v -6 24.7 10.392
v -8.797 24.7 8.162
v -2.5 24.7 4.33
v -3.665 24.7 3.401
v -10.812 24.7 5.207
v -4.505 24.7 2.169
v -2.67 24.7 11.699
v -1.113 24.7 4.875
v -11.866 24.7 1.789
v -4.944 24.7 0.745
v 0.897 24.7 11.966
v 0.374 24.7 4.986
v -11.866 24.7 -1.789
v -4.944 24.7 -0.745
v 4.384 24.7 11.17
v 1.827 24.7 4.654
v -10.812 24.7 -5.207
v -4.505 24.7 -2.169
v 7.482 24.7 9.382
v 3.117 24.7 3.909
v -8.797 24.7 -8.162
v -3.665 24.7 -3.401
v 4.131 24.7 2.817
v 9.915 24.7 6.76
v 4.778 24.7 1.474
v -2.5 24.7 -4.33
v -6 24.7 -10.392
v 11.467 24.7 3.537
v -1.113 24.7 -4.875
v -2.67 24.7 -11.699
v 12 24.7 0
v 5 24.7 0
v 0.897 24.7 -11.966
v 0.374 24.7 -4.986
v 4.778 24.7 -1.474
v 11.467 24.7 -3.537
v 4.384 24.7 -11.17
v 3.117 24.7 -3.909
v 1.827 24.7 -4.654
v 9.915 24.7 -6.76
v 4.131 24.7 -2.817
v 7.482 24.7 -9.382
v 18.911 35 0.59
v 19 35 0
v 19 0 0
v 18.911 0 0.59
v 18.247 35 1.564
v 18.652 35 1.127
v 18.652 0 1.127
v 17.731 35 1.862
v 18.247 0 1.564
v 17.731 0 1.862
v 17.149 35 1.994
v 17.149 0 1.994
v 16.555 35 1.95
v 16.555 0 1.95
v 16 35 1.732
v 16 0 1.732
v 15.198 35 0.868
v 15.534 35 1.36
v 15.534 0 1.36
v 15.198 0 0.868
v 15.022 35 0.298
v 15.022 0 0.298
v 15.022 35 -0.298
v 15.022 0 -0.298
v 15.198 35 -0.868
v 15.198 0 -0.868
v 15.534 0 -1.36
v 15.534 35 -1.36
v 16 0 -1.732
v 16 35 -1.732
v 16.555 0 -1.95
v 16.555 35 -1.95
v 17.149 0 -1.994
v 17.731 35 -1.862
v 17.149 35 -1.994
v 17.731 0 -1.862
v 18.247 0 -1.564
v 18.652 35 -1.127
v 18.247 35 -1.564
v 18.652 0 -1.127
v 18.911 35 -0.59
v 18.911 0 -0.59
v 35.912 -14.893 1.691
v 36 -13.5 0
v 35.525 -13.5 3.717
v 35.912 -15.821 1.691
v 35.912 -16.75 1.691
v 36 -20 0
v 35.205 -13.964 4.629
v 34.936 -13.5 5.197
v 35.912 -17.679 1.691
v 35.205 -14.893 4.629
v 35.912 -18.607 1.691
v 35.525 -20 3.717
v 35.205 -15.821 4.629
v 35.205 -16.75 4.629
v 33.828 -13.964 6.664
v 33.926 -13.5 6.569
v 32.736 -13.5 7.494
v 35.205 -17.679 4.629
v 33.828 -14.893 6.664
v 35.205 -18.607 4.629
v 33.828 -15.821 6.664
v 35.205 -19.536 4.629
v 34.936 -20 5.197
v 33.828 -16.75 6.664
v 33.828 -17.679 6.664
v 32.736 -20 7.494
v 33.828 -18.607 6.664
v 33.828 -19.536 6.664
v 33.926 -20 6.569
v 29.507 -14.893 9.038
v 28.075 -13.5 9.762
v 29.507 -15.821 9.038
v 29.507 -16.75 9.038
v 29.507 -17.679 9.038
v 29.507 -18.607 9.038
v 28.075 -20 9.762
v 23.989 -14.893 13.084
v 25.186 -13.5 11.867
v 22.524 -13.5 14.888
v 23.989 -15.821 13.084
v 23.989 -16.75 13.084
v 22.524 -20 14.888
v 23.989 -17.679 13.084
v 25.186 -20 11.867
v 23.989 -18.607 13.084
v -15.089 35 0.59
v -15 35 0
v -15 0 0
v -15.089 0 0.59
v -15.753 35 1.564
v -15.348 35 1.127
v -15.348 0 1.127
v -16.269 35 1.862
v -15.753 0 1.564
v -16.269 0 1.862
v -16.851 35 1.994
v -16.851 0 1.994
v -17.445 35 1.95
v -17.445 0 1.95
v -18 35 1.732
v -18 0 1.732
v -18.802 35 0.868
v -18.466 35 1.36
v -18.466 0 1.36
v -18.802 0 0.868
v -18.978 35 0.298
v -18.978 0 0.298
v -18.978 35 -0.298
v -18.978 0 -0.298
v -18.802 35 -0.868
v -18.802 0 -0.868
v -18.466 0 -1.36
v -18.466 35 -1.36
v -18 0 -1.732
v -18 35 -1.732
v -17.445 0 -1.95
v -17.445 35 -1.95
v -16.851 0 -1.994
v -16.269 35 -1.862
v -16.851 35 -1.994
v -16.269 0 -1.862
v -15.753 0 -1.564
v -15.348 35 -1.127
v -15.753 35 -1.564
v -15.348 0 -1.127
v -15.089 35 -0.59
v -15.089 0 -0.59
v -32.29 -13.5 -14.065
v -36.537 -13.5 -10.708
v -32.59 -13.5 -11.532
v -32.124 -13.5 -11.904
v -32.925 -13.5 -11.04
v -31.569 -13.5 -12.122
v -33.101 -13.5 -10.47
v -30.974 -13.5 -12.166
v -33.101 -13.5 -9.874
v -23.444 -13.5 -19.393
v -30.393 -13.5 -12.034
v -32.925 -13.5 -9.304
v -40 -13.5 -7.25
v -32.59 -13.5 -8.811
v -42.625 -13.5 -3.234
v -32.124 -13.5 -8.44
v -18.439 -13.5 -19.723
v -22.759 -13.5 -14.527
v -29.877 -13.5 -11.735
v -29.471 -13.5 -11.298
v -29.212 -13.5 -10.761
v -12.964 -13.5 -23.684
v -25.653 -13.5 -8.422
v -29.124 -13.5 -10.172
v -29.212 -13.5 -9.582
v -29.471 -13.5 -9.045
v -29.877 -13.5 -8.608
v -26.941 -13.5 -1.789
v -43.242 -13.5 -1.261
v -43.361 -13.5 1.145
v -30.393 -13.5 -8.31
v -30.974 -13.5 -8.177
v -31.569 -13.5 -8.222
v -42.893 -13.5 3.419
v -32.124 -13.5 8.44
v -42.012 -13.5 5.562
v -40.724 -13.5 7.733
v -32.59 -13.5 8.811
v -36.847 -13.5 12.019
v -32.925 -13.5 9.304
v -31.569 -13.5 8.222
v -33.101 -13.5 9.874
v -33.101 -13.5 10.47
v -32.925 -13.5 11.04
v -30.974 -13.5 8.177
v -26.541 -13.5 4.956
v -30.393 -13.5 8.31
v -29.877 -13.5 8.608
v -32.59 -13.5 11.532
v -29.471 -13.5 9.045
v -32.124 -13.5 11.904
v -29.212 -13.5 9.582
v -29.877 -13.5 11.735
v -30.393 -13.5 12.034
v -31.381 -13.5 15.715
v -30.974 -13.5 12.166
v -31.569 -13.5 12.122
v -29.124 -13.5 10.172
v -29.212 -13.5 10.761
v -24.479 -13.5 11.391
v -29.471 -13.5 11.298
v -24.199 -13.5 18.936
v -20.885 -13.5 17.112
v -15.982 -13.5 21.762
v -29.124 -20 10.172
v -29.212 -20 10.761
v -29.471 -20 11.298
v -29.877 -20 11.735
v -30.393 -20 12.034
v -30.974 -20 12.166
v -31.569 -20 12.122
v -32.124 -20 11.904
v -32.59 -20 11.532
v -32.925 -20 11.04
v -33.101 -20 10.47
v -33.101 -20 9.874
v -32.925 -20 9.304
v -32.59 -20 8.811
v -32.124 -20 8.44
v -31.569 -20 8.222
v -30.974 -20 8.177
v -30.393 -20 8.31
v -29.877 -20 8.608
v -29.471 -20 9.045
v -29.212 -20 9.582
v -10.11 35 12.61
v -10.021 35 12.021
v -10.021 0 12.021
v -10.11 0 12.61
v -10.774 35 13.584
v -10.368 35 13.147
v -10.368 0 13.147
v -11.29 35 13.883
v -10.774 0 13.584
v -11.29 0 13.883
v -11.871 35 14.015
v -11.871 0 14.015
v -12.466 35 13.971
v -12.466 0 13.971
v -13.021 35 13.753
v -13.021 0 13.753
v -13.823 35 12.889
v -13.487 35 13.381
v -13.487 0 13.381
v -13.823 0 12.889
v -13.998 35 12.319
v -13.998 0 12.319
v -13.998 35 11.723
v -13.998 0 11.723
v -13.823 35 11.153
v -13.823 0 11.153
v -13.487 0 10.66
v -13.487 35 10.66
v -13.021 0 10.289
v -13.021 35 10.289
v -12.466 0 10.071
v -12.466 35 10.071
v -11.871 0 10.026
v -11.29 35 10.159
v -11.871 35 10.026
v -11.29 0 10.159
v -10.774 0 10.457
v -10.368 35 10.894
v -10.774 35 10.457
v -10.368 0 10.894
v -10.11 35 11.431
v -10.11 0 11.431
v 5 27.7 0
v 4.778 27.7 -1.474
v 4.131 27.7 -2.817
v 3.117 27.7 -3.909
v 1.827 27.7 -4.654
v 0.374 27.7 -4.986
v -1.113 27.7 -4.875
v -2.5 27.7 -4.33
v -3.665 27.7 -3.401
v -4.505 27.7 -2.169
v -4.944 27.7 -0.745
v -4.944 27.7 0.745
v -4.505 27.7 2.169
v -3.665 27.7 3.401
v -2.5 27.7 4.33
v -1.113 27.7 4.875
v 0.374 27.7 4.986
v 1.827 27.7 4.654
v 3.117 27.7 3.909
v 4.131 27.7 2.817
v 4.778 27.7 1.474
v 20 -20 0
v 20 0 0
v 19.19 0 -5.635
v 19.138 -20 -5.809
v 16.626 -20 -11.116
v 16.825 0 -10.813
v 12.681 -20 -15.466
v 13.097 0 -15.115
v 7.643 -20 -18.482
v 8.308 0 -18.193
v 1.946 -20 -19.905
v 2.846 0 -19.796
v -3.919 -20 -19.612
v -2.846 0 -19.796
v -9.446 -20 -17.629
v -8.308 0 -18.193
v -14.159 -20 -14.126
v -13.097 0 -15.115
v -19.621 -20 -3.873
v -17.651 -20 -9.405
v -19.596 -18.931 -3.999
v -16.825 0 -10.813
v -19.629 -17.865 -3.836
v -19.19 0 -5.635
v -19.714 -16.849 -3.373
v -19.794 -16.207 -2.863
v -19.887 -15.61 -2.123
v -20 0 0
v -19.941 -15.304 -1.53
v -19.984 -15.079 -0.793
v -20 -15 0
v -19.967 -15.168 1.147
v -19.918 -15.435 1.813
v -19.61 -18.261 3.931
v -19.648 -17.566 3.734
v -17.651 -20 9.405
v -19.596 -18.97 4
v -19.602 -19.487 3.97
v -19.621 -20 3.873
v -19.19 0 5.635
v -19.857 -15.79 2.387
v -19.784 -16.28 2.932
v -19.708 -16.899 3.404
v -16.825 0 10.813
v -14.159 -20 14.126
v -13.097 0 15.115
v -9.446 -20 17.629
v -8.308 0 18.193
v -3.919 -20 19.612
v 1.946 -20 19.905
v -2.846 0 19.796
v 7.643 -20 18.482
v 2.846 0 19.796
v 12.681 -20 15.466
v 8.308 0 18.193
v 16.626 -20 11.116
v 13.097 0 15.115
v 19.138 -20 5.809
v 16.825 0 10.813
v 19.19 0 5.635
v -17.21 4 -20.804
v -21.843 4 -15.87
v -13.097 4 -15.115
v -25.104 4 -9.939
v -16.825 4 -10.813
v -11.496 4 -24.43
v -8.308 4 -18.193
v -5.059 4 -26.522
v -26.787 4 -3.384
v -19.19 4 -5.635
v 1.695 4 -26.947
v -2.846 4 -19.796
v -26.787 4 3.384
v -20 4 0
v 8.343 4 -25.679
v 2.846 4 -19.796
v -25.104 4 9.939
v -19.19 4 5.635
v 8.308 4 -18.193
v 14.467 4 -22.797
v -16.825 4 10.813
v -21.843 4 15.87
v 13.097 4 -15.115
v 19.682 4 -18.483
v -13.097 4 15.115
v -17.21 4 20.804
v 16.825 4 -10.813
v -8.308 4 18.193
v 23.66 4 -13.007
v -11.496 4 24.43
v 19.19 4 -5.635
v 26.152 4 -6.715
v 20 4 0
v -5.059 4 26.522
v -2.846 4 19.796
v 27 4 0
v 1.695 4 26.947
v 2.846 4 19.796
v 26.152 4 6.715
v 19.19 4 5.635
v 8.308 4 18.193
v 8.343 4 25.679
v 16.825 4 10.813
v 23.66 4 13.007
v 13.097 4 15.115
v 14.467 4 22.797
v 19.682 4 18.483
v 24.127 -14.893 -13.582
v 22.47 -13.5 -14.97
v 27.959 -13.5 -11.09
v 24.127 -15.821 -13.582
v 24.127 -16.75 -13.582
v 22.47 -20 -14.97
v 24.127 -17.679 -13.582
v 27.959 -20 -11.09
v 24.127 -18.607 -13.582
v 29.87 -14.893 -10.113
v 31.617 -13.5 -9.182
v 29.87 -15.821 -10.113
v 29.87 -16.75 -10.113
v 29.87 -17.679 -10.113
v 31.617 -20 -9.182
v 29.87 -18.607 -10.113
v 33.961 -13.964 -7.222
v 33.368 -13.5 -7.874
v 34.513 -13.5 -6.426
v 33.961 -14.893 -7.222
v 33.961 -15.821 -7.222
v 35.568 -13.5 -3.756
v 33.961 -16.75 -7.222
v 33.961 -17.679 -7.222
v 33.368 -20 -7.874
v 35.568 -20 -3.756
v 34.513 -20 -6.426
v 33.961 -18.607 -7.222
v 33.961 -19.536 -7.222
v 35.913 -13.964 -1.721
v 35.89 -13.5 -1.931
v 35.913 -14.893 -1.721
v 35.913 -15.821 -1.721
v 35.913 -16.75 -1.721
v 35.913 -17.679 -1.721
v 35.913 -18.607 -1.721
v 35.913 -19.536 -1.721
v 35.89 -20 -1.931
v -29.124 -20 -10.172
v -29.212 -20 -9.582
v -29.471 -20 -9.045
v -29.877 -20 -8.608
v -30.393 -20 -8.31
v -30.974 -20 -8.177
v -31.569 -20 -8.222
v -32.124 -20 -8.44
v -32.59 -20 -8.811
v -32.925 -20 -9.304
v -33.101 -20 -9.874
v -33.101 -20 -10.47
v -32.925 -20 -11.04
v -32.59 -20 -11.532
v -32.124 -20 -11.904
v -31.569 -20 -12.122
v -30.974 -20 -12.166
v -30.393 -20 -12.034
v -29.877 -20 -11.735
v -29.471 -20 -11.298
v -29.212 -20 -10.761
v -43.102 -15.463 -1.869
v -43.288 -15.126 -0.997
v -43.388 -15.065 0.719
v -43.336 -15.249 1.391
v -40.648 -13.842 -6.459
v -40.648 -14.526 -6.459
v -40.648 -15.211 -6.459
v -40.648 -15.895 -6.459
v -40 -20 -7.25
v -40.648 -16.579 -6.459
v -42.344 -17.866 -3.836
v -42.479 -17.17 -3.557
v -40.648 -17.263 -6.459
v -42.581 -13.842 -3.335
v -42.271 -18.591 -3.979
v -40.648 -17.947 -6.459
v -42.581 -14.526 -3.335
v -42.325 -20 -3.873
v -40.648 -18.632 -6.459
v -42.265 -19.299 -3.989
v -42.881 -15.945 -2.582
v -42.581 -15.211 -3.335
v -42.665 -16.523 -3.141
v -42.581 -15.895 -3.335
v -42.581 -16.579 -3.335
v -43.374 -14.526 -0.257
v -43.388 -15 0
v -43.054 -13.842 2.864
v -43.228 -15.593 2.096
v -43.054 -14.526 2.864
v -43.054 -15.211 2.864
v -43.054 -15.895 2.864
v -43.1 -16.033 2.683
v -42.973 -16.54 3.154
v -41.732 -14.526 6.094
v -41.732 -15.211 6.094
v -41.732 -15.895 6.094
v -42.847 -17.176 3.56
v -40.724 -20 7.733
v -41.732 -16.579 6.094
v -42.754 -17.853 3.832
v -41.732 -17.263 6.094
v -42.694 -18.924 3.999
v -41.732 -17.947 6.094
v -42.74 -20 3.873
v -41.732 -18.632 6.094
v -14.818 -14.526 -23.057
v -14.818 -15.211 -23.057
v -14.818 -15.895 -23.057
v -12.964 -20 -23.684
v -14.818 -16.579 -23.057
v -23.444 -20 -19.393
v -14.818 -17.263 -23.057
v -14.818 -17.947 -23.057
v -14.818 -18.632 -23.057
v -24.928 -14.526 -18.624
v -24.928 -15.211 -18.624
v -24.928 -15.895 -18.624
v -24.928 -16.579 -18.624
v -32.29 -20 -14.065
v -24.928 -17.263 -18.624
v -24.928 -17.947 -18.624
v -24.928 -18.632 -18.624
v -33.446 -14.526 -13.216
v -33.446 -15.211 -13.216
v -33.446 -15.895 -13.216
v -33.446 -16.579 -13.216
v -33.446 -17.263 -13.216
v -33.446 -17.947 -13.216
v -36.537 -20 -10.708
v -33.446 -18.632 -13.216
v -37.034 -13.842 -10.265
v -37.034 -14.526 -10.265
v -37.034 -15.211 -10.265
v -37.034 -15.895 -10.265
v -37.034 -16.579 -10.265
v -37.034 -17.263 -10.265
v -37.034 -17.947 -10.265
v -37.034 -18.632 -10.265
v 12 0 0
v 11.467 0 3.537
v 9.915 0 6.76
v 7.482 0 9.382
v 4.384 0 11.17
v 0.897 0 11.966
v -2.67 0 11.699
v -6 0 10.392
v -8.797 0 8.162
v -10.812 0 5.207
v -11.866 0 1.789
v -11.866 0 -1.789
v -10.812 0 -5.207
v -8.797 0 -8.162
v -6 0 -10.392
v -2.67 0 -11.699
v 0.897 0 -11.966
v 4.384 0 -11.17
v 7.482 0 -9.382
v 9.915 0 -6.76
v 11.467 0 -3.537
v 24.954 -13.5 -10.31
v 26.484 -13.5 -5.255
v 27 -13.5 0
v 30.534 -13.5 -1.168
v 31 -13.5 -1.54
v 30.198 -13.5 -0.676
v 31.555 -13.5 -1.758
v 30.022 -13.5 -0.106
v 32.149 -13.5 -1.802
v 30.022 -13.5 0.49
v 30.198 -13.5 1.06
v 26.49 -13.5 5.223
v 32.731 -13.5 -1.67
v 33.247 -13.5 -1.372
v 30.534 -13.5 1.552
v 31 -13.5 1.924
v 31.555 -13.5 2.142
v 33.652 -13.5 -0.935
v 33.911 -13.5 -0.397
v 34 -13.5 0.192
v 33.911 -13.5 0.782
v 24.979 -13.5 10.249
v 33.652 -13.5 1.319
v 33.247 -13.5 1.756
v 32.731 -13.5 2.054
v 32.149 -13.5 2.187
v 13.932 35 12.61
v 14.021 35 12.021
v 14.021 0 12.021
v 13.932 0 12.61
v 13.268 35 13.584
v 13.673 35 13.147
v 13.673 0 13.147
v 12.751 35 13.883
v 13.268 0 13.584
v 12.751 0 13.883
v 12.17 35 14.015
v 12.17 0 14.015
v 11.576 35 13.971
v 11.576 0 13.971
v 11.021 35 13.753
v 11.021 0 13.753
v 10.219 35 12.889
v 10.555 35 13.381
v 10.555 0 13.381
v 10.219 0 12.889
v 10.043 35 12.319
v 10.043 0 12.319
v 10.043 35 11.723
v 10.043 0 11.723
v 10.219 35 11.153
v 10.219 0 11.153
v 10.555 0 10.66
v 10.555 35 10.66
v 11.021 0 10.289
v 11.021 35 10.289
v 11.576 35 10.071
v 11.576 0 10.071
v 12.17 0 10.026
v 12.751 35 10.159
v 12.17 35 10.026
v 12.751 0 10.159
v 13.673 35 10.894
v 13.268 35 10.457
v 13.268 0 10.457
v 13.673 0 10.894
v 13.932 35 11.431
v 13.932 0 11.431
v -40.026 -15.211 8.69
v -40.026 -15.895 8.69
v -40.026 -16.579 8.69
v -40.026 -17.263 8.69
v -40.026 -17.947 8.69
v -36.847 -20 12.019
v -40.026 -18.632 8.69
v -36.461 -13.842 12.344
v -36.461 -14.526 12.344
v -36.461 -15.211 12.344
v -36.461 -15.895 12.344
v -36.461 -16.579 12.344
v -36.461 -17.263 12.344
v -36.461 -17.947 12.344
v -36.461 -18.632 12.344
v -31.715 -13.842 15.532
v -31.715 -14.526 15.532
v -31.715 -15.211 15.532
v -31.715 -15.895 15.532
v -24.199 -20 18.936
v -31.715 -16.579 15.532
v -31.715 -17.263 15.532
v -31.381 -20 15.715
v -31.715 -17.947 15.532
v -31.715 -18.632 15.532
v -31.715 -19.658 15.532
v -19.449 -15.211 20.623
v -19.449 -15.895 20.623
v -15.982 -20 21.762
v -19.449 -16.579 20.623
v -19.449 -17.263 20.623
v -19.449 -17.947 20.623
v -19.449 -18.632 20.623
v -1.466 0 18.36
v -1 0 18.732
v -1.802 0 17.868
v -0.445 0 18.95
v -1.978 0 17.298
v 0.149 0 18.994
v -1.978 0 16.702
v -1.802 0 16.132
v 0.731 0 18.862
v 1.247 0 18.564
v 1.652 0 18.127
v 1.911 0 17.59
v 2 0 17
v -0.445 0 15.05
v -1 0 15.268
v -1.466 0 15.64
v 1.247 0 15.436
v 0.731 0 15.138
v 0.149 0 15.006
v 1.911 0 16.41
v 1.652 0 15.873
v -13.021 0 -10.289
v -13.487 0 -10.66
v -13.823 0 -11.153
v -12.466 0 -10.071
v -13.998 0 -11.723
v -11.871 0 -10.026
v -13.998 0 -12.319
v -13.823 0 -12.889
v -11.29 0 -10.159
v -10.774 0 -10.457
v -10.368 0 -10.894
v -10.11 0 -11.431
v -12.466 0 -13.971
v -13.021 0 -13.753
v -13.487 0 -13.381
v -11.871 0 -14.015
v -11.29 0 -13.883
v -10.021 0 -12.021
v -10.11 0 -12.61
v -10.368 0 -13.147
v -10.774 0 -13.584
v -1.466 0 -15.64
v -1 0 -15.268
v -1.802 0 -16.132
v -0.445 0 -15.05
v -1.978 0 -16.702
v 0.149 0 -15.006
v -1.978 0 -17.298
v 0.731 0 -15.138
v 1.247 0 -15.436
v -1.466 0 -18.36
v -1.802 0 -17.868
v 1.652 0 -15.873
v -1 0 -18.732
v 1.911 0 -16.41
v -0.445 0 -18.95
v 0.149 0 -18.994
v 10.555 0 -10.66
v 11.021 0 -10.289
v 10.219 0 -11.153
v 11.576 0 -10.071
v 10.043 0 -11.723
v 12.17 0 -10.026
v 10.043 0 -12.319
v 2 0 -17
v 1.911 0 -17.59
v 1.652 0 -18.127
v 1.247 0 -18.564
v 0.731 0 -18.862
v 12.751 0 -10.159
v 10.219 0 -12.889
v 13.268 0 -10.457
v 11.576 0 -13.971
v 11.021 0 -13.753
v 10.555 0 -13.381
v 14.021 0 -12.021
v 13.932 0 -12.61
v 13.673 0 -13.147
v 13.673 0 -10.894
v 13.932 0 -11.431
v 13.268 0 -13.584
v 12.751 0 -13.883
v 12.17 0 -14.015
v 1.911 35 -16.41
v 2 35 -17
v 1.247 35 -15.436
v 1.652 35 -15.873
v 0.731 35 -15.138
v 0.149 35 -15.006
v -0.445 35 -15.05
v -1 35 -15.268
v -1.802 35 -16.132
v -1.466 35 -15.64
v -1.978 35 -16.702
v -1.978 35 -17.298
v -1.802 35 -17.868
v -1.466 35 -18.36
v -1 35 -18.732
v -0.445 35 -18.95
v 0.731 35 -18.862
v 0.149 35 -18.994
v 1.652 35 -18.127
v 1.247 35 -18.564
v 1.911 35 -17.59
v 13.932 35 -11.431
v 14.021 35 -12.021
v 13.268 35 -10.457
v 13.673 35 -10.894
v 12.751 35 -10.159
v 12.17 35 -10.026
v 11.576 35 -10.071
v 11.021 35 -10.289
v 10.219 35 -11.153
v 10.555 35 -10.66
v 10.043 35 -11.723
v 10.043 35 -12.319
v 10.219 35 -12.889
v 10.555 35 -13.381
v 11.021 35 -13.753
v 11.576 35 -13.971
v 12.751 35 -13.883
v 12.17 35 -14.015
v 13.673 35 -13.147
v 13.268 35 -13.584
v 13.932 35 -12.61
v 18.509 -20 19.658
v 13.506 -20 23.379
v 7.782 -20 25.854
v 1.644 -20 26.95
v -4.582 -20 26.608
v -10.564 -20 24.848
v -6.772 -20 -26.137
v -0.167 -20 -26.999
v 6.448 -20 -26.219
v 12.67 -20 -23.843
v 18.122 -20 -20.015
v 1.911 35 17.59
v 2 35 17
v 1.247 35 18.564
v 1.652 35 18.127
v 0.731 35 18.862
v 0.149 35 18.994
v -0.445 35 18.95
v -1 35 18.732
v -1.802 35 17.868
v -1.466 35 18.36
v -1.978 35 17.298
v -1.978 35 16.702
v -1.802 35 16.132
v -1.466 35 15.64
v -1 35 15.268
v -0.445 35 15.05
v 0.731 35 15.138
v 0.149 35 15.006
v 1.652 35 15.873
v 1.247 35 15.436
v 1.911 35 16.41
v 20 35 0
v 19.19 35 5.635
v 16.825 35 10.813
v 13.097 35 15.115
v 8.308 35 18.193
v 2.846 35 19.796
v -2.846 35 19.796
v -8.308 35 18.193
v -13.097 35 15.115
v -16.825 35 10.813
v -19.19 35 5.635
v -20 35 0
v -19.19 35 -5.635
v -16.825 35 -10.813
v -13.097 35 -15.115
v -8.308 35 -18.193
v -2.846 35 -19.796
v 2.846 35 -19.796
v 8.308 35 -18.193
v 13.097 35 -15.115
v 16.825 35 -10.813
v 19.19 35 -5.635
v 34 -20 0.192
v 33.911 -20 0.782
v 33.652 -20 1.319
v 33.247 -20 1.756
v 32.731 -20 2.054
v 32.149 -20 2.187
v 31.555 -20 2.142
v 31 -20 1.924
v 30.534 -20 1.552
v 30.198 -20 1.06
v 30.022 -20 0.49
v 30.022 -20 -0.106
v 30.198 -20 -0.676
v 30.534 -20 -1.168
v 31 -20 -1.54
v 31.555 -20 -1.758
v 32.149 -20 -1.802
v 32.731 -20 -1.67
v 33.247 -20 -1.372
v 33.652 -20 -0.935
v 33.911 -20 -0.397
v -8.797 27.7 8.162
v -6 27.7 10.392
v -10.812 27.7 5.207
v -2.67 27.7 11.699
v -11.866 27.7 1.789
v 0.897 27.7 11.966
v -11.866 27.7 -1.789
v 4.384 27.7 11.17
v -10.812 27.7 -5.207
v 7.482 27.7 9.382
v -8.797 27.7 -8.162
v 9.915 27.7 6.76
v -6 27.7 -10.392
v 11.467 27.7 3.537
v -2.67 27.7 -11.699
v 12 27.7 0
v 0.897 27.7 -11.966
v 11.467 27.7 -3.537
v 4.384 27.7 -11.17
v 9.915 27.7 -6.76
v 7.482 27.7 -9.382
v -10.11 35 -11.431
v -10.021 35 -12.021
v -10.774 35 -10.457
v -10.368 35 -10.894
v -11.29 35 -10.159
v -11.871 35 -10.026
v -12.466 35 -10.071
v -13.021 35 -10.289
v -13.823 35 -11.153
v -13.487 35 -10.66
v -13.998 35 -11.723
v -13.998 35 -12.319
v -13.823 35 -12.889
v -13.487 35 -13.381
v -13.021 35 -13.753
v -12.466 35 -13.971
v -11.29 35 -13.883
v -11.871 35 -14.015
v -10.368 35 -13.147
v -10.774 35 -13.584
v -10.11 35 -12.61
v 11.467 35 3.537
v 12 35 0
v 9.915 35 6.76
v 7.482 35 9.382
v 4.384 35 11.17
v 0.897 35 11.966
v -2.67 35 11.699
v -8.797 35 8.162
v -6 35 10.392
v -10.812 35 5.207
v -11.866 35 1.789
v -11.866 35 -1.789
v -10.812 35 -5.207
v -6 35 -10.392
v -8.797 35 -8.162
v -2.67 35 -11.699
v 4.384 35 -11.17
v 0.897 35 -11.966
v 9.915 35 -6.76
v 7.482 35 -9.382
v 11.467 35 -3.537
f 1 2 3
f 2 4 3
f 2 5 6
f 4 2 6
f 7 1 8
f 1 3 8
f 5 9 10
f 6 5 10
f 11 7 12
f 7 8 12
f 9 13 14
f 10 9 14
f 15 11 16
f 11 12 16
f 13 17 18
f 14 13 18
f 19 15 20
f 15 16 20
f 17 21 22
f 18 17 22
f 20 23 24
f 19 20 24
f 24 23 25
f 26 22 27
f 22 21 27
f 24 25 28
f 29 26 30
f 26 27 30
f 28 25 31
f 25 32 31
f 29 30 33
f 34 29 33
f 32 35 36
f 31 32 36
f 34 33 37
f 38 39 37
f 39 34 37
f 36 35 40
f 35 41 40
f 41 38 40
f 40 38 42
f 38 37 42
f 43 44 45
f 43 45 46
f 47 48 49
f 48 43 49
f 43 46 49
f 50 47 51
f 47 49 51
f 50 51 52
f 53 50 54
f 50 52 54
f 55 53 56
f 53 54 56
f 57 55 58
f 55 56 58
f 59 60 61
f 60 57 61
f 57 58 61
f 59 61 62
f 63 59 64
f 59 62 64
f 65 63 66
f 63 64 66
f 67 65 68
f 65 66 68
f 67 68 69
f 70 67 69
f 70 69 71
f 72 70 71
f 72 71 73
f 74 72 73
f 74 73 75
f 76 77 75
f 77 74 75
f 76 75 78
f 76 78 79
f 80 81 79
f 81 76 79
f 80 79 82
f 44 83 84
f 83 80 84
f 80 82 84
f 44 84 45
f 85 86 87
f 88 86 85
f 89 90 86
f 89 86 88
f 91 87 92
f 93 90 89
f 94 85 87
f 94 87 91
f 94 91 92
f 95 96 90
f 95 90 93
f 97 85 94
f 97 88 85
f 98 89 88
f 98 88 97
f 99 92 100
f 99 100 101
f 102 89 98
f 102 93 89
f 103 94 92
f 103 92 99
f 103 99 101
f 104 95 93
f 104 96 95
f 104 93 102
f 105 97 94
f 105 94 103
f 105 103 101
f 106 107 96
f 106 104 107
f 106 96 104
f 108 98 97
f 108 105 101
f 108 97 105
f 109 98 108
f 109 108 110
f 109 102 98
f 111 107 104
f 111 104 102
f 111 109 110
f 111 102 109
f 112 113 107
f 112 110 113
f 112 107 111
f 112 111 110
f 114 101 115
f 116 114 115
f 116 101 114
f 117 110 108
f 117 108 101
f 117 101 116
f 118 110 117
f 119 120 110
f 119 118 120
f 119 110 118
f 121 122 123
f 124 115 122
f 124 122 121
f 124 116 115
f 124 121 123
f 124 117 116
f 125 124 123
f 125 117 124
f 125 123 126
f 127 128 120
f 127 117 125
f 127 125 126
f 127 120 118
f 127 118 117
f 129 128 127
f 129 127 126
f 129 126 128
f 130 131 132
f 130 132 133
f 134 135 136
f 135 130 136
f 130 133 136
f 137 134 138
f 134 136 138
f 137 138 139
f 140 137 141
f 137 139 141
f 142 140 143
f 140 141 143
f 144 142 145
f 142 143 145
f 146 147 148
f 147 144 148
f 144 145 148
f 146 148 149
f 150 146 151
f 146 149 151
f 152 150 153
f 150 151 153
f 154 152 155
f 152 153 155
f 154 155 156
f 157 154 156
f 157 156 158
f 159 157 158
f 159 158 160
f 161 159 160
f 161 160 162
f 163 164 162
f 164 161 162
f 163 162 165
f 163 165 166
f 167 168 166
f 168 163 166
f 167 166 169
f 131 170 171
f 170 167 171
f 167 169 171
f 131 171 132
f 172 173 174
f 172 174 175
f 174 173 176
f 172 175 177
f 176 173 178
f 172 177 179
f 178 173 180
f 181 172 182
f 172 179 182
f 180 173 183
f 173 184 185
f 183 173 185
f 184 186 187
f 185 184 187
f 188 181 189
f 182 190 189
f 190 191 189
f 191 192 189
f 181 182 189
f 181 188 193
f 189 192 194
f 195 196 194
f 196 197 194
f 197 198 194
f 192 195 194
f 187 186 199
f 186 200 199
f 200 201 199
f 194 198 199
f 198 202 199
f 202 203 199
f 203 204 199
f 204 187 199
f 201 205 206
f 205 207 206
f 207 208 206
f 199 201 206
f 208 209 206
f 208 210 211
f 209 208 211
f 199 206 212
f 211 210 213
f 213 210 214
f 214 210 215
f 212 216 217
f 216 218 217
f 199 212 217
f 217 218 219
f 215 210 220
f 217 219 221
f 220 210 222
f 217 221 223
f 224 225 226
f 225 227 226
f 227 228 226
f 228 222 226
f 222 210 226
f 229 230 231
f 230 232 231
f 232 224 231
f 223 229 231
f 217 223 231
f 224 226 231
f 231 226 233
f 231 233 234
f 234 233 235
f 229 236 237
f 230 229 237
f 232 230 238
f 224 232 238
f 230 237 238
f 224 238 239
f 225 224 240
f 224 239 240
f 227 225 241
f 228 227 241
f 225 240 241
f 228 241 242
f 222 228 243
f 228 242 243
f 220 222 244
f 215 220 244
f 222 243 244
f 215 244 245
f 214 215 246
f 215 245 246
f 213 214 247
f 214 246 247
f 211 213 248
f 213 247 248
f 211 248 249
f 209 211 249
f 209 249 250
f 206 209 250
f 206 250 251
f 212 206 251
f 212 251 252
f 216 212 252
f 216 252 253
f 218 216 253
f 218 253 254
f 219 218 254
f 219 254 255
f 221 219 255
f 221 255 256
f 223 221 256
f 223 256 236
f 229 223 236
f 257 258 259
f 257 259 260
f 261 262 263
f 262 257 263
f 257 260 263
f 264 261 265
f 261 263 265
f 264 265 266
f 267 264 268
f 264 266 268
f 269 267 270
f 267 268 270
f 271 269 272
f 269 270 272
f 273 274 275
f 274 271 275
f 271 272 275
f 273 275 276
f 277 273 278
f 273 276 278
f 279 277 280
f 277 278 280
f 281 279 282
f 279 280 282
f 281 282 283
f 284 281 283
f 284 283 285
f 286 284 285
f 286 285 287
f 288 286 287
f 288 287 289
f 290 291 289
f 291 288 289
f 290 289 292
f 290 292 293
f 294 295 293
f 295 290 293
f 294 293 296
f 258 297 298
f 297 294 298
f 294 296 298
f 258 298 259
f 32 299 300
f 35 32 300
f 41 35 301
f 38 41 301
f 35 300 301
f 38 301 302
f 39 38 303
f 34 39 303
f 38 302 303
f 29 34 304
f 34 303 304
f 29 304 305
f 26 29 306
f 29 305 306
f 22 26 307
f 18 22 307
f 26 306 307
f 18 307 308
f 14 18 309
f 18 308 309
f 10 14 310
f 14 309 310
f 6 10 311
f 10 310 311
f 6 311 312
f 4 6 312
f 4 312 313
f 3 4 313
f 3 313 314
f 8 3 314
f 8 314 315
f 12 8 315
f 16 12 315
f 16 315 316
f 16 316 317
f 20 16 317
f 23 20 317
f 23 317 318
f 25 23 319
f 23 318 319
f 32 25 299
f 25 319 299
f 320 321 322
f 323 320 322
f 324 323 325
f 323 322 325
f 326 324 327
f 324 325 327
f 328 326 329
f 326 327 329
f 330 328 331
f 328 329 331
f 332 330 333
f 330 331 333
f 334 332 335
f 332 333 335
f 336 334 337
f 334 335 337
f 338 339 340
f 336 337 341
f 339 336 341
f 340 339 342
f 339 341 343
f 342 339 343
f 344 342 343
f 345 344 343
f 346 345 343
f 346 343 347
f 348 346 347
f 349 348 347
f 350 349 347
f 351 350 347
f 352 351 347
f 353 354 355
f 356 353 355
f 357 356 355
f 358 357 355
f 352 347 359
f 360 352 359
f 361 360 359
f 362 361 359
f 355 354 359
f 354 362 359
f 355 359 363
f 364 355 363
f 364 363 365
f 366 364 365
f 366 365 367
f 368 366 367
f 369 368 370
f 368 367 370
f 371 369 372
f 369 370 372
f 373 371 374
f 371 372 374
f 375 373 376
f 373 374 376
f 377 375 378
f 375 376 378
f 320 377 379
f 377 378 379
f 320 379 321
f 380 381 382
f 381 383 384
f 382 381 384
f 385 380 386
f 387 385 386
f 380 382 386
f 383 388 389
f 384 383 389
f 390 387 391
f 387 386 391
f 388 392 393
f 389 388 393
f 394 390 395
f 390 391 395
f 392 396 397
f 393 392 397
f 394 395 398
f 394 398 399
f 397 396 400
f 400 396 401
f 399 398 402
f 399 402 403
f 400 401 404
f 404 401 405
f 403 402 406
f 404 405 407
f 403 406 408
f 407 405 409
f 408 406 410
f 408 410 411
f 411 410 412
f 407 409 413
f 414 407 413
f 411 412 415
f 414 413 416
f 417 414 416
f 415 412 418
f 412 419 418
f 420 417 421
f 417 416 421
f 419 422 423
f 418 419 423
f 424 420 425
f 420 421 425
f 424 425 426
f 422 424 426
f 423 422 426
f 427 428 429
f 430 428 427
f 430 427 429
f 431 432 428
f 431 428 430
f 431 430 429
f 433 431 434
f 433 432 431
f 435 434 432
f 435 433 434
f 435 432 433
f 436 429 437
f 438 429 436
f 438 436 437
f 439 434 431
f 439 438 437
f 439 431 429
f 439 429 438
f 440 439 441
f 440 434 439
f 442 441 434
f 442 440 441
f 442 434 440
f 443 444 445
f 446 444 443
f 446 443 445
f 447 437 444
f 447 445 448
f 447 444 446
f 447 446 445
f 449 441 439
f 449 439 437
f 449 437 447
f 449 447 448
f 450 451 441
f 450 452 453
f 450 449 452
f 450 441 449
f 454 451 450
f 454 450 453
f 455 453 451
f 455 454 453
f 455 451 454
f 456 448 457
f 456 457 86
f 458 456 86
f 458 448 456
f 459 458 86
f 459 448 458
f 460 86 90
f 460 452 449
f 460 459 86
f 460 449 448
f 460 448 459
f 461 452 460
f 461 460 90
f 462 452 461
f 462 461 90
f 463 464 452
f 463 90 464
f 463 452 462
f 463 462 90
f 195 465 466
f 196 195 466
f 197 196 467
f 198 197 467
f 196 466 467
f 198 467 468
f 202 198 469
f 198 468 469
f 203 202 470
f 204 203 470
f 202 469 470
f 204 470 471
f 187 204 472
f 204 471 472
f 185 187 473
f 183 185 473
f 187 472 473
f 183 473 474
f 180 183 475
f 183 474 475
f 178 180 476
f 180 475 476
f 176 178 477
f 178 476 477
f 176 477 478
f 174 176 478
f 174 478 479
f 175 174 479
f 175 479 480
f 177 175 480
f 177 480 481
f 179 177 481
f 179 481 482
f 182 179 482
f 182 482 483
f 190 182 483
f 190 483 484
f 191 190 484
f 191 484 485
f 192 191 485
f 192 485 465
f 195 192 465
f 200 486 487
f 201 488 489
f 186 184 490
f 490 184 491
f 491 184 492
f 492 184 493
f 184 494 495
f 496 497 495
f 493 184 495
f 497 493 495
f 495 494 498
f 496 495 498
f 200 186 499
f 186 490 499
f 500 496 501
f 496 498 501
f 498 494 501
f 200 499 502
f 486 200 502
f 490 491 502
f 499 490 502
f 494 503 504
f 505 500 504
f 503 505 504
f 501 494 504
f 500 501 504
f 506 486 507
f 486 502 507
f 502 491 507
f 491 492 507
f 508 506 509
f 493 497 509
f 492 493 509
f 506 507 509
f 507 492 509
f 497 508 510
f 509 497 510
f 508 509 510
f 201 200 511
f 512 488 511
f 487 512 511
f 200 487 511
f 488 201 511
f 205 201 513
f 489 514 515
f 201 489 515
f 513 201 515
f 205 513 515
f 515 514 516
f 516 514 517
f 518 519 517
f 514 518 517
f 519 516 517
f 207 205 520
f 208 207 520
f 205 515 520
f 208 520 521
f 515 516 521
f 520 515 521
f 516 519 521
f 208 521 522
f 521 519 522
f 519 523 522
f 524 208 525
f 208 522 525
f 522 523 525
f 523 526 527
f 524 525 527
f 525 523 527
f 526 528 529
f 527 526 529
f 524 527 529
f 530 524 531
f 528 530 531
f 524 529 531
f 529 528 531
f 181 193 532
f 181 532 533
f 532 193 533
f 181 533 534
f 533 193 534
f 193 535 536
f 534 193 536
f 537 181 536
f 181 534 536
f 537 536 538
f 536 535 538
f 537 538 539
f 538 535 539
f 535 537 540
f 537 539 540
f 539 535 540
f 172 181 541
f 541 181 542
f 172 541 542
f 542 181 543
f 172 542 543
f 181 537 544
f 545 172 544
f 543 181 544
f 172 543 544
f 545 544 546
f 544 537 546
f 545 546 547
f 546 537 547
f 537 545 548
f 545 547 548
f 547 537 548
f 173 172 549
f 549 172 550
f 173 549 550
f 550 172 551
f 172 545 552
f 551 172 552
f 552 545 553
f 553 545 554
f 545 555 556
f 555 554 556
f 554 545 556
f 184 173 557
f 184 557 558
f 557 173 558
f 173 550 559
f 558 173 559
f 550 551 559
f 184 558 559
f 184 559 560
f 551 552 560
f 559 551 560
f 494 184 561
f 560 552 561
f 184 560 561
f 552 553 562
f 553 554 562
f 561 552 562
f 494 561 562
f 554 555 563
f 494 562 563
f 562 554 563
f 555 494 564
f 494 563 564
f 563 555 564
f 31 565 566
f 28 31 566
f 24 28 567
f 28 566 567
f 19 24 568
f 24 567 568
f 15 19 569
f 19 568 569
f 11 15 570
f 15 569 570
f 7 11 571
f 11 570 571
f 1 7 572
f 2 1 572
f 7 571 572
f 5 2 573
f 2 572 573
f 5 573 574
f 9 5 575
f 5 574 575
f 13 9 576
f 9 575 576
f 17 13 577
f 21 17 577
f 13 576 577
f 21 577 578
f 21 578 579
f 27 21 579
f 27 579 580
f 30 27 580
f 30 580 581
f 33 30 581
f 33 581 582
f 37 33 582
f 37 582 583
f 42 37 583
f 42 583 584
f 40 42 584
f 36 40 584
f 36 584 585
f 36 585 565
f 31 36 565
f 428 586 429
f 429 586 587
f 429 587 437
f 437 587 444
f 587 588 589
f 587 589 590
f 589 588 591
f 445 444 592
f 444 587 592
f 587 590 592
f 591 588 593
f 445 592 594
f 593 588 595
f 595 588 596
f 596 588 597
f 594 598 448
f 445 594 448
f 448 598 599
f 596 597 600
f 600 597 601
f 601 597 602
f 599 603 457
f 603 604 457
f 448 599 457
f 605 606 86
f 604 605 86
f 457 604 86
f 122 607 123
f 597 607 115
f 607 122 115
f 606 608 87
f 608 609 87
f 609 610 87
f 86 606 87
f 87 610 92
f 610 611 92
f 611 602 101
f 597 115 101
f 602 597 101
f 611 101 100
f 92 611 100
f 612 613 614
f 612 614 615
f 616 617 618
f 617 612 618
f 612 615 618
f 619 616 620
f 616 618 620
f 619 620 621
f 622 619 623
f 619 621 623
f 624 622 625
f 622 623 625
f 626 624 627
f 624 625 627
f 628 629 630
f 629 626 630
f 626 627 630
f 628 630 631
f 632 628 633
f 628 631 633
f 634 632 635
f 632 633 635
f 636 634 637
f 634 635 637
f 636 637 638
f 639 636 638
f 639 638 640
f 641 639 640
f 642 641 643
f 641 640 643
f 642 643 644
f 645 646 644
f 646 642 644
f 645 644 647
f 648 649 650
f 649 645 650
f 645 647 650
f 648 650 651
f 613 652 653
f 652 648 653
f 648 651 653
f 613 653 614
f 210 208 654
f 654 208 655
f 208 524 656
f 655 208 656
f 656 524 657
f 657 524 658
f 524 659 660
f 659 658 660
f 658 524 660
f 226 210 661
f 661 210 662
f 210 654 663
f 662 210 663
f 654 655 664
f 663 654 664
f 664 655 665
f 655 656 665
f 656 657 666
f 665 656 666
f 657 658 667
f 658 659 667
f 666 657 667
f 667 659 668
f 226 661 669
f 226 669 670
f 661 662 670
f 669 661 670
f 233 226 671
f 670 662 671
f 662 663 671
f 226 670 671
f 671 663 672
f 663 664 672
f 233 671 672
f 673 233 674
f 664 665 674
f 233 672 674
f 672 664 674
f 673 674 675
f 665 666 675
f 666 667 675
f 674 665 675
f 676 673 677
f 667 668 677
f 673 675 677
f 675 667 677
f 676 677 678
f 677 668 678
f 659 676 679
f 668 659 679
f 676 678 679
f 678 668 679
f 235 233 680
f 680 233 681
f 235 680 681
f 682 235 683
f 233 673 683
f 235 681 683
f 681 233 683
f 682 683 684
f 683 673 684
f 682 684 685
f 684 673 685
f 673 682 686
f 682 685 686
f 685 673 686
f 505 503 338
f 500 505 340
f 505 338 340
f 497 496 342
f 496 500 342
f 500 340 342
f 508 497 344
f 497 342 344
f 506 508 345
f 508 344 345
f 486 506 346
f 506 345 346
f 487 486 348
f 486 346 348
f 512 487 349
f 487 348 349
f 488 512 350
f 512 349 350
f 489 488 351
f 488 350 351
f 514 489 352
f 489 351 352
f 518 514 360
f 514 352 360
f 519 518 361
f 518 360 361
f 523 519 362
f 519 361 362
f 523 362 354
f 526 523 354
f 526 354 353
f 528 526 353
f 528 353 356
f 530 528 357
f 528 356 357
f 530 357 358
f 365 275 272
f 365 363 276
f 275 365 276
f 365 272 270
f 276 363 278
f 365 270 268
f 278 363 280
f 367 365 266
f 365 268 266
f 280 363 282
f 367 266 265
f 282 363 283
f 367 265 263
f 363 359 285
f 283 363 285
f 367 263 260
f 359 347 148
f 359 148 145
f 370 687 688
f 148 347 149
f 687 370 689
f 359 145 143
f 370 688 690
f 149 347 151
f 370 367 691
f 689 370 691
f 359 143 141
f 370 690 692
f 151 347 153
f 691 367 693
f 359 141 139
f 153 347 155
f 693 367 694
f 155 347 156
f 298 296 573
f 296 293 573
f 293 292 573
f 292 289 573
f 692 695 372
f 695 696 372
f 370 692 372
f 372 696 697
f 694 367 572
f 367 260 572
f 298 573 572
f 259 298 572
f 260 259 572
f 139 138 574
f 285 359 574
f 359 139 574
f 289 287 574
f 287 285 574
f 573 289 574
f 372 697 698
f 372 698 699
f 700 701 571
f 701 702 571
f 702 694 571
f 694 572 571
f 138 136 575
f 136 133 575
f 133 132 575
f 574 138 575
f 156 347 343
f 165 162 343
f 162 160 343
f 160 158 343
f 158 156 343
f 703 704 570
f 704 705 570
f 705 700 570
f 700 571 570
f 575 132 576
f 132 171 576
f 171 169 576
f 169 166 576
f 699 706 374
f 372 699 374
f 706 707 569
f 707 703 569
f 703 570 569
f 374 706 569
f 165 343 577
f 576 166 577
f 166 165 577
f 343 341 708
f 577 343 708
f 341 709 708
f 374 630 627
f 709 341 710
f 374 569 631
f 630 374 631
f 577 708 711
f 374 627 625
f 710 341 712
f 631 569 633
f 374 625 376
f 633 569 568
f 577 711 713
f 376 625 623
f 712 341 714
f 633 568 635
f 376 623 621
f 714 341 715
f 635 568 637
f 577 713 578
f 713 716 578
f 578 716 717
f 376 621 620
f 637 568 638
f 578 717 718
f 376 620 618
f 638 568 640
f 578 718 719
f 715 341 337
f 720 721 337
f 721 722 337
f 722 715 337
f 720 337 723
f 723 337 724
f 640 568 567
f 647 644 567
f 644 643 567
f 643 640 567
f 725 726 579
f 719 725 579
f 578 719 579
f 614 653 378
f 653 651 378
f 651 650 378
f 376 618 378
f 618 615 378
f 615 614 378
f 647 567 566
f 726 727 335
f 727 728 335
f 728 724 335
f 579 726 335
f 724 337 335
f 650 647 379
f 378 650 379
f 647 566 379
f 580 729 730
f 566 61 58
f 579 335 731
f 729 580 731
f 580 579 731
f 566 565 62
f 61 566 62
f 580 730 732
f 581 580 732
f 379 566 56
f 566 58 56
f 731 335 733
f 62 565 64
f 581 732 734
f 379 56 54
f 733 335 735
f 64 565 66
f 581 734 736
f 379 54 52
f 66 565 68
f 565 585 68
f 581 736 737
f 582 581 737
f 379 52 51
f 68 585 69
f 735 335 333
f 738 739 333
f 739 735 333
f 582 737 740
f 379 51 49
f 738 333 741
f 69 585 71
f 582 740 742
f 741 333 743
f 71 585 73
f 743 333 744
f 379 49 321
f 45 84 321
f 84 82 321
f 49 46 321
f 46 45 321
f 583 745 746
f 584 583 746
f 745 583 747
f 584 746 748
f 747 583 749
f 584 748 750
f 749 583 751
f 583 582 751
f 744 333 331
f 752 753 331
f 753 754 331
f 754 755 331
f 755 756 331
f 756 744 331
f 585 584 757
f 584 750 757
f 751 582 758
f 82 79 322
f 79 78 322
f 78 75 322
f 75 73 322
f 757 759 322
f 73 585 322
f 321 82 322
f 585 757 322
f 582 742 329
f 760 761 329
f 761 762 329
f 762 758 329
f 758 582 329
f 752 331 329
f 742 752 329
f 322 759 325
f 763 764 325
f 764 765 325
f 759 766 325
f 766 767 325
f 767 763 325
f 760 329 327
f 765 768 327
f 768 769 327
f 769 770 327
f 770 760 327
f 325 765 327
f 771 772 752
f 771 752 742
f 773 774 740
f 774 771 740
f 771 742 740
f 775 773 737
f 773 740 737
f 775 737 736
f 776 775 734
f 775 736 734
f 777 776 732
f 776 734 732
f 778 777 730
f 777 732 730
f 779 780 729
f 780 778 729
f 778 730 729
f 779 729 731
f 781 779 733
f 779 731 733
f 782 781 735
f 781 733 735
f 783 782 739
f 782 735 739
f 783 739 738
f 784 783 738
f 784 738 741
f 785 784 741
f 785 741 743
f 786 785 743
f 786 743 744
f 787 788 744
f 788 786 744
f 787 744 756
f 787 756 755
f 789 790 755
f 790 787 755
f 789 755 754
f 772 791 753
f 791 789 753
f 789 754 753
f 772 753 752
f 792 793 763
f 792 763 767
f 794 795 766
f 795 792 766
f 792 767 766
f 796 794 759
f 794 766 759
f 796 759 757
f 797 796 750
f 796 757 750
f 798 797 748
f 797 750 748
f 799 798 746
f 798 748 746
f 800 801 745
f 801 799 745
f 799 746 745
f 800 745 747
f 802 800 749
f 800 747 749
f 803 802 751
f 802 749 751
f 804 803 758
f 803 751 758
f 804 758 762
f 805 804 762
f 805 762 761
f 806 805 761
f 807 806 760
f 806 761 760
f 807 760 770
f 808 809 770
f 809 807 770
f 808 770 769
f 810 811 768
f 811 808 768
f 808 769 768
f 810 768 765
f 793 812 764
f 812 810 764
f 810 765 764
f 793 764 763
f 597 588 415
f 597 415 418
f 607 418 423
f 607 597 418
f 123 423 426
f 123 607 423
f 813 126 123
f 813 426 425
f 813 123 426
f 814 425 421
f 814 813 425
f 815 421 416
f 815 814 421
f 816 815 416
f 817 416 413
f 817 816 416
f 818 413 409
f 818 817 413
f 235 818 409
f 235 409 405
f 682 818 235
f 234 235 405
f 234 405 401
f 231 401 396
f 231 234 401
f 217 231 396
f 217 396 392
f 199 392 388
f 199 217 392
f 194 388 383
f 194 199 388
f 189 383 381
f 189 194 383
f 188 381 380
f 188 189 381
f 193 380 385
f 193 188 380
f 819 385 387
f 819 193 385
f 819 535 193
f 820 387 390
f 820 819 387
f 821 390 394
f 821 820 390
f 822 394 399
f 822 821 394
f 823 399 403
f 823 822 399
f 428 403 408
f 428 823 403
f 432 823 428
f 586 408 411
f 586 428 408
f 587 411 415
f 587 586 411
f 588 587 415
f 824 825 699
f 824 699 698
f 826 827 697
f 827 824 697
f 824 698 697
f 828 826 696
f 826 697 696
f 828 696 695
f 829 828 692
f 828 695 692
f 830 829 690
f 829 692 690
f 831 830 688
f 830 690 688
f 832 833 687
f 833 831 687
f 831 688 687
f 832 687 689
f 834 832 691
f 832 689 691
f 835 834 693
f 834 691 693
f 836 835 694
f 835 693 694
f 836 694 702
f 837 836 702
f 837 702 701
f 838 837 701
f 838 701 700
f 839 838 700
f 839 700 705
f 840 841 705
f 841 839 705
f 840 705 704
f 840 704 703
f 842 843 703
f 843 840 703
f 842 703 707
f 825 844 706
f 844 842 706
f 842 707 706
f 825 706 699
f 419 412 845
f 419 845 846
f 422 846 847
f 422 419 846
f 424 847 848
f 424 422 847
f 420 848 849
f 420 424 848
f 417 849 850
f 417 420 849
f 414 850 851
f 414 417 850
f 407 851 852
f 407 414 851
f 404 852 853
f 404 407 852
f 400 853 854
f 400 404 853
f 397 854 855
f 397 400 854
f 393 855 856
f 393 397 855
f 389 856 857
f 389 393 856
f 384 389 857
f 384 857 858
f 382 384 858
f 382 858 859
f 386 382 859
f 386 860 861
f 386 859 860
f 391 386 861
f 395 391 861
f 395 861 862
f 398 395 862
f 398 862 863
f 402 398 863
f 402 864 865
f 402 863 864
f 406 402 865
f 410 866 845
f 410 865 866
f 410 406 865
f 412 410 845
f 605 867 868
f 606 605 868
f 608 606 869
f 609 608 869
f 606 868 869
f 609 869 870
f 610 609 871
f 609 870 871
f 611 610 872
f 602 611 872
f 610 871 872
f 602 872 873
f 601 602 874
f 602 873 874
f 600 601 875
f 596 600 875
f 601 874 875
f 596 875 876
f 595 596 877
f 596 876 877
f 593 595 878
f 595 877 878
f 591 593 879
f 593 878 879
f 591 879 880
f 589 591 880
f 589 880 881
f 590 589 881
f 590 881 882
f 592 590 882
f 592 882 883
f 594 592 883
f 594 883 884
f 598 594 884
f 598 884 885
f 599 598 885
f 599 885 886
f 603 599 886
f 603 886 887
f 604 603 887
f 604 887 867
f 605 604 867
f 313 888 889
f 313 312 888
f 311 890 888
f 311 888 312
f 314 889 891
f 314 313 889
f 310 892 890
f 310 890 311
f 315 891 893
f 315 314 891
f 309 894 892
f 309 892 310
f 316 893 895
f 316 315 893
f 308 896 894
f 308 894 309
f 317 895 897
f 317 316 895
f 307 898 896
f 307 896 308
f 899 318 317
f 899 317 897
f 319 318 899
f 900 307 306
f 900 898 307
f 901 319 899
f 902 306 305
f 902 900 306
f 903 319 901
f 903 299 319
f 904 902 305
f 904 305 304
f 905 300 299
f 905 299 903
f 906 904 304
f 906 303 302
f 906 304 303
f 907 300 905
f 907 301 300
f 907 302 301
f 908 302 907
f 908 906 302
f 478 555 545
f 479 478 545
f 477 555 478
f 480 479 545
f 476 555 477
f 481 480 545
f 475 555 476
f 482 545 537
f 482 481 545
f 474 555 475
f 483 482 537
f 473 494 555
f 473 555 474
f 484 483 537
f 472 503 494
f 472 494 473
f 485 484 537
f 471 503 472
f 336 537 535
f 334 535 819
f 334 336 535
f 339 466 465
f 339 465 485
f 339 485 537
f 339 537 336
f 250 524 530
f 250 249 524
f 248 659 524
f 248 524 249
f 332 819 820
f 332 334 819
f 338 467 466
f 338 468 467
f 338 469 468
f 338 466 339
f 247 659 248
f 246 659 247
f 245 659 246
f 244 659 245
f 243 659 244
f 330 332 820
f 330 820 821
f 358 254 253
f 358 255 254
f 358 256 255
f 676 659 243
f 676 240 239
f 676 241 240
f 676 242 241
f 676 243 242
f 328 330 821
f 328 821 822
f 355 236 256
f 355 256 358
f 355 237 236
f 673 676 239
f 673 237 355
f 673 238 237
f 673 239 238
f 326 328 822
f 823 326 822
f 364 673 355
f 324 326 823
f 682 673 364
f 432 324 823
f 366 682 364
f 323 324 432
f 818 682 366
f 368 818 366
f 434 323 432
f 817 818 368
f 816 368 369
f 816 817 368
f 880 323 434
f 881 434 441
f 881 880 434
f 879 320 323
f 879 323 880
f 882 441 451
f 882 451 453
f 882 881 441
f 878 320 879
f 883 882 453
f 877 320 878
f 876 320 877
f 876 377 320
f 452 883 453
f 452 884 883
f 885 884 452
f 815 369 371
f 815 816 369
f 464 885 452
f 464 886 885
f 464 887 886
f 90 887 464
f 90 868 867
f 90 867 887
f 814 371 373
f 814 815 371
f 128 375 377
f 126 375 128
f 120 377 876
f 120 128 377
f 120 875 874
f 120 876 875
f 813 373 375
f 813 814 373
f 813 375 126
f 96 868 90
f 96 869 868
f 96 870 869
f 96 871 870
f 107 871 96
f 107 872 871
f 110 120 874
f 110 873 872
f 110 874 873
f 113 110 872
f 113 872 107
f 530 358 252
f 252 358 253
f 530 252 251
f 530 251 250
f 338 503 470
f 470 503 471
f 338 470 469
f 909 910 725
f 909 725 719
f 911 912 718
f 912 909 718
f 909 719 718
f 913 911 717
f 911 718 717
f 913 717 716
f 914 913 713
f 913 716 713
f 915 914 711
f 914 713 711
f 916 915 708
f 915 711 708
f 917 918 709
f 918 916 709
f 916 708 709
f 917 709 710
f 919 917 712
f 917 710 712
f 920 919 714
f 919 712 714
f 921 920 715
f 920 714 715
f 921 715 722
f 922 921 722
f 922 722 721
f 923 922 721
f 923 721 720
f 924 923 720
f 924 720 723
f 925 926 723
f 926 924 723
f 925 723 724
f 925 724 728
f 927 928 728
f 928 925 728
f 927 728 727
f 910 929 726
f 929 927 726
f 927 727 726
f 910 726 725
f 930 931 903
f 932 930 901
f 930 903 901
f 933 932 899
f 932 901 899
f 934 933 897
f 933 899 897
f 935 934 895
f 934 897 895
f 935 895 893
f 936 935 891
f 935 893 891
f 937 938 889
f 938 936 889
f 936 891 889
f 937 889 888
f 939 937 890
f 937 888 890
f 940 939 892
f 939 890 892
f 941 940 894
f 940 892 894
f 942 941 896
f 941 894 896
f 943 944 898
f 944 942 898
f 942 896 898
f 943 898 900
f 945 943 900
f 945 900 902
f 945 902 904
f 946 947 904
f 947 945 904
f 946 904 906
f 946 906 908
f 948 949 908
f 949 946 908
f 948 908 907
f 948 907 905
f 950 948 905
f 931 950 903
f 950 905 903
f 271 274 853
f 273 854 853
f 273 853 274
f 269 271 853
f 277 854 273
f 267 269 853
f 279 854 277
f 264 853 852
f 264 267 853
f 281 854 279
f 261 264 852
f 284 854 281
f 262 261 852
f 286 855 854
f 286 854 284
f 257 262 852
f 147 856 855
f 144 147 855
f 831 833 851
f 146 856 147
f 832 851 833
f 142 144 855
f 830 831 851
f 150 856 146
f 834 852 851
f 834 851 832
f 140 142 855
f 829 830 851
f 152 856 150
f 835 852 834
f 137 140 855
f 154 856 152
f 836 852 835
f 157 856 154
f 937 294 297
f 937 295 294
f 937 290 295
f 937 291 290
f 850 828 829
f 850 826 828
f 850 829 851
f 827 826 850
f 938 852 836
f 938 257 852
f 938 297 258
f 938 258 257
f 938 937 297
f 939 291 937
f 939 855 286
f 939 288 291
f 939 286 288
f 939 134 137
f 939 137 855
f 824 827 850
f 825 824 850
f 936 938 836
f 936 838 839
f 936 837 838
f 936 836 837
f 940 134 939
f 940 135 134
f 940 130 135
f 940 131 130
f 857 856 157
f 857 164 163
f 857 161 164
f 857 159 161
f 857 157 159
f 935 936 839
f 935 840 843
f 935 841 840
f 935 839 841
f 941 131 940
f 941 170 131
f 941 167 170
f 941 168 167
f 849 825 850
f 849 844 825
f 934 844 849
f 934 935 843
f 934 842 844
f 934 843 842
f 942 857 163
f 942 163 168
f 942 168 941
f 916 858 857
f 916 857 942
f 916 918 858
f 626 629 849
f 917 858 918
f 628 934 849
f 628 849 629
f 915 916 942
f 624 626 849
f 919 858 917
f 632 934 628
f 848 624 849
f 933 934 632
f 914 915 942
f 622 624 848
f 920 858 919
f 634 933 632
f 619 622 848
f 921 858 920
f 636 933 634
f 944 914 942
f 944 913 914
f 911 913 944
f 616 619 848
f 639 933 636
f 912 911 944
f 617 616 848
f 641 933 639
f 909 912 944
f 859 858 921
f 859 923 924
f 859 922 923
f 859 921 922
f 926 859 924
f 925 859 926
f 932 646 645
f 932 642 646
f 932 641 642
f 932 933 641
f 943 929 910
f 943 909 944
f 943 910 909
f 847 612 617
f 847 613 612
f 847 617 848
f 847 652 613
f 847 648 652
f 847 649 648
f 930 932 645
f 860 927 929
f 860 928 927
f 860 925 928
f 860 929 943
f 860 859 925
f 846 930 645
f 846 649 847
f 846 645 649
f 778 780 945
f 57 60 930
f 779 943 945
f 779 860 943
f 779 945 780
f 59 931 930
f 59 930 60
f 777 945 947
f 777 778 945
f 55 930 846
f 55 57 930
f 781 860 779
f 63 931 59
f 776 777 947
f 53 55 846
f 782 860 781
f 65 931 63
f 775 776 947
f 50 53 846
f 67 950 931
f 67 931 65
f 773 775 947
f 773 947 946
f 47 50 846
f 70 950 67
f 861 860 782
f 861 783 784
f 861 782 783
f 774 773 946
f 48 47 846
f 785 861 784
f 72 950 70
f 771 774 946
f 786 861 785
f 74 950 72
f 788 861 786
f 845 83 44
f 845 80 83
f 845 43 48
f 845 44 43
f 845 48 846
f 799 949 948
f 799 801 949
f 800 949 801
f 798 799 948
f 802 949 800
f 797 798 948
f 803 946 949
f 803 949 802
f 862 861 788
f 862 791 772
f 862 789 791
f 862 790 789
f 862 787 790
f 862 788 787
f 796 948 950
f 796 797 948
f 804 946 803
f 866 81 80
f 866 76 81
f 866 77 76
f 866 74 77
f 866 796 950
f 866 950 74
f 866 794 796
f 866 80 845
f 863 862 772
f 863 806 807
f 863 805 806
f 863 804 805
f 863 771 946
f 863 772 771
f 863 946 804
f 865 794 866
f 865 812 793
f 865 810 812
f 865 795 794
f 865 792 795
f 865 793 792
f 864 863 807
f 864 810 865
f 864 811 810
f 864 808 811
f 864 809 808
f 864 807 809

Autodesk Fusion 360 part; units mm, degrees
sketch "Boceto5" plane through (0, 0, 0) normal (0, 1, 0) x (1, 0, 0)
  circle A0 centre (0, 0) radius 12
  circle A1 centre (0, 0) radius 20
  line L0 (0, -18) -> (0, 20) construction
  line L1 (0, 20) -> (22, 0) construction
  line L2 (22, 0) -> (-21, 0) construction
  circle A2 centre (0, -17) radius 2
  circle A3 centre (12.0208, -12.0208) radius 2
  circle A4 centre (17, 0) radius 2
  circle A5 centre (12.0208, 12.0208) radius 2
  circle A6 centre (0, 17) radius 2
  circle A7 centre (-12.0208, 12.0208) radius 2
  circle A8 centre (-17, 0) radius 2
  circle A9 centre (-12.0208, -12.0208) radius 2
  dimension "d1" = 24
  dimension "d2" = 40
  dimension "d3" = 8
  dimension "d4" = 4
  dimension "d5" = 17
  dimension "d7" = 360
extrude "Extruir1" add sketch "Boceto5" along normal blind 35
ref_plane "PlanoDeObra1" through (0, 27.7, 0) normal (0, 1, 0) x (1, 0, 0)
sketch "Boceto6" plane through (0, 27.7, 0) normal (0, 1, 0) x (1, 0, 0)
  circle A0 centre (0, 0) radius 13.2354
  circle A1 centre (0, 0) radius 5
  dimension "d11" = 10
extrude "Extruir2" add sketch "Boceto6" against normal blind 3
sketch "Boceto7" plane through (0, 0, 0) normal (0, -1, 0) x (1, 0, 0)
  circle A0 centre (-12.0208, 12.0208) radius 2
  circle A1 centre (12.0208, 12.0208) radius 2
  circle A2 centre (-12.0208, -12.0208) radius 2
  circle A3 centre (0, 0) radius 12
  circle A4 centre (17, 0) radius 2
  circle A5 centre (12.0208, -12.0208) radius 2
  circle A6 centre (-17, 0) radius 2
  circle A7 centre (0, -17) radius 2
  circle A8 centre (0, 17) radius 2
  circle A9 centre (0, 0) radius 20
  circle A10 centre (0, 0) radius 27
  circle A11 centre (0, 0) radius 12
extrude "Extruir3" add sketch "Boceto7" along normal blind 20 and the other way blind 4 contours A10
sketch "Boceto8" plane through (0, -20, 0) normal (0, -1, 0) x (1, 0, 0)
  circle A0 centre (0, 0) radius 20
  circle A1 centre (0, 0) radius 27
  spline S0 degree 5 poles (0.8049, -26.988) (-1.1916, -26.6528) (-5.0661, -25.9145) (-10.5223, -24.6033) (-17.129, -22.45) (-24.4438, -19.1245) (-30.9638, -15.2359) (-36.6141, -10.944) (-41.1579, -6.4179) (-43.6205, -2.0992) (-43.7018, 2.1218) (-41.8139, 6.6729) (-38.2196, 11.3661) (-32.8205, 15.2954) (-25.9465, 18.4821) (-17.9948, 21.1667) (-11.1308, 23.2874) (-5.8571, 25.0495) (-2.3066, 26.329) (-0.5226, 26.9949) knots 0 0 0 0 0 0 0.066667 0.133333 0.2 0.266667 0.333333 0.4 0.466667 0.533333 0.6 0.666667 0.733333 0.8 0.866667 0.933333 1 1 1 1 1 1
  spline S1 degree 5 poles (22.4701, -14.9698) (23.4209, -14.1205) (25.2562, -12.6285) (27.8097, -11.0079) (30.796, -9.7676) (33.7124, -8.1227) (35.6265, -5.0956) (36.3527, 0.0255) (35.6595, 4.9302) (33.5709, 7.4325) (30.4274, 8.6009) (27.3931, 9.8371) (24.9893, 11.8342) (23.3518, 13.7692) (22.5244, 14.888) knots 0 0 0 0 0 0 0.1 0.2 0.3 0.4 0.5 0.6 0.7 0.8 0.9 1 1 1 1 1 1
  line L0 (36, -3.7373) -> (36, 3.7373)
  line L1 (18.3284, -18.669) -> (26.6118, -11.2706)
  line L2 (26.1391, 10.0004) -> (18.9097, 19.7756)
  circle A2 centre (32, 0.1921) radius 2
  circle A3 centre (-31.1235, -10.1718) radius 2
  line L3 (-65, 0) -> (0, 0) construction
  line L4 (0, 0) -> (0, -32.1871) construction
  circle A4 centre (-31.1235, 10.1718) radius 2
  line L5 (-46.074, -0.0716) -> (-35.3734, 15.5371)
  circle A5 centre (0, 0) radius 27 construction
  line L6 (15.8053, -29.5065) -> (-14.1954, -24.4695)
  line L7 (-14.284, 21.8582) -> (13.2387, 32.1317)
  line L8 (-33.4619, -14.8868) -> (-46.5381, 0.3871)
  point P0 (-40, -7.2498)
  point P1 (-40.7237, 7.7327)
  point P2 (36, 0)
  dimension "d18" = 4
  dimension "d19" = 4
  dimension "d20" = 36
  dimension "d21" = 32
  dimension "d22" = 15
  dimension "d23" = 40
  dimension "d24" = 30
  dimension "d25" = 105
extrude "Extruir4" add sketch "Boceto8" against normal blind 6.5 contours A1 S1 | A1 S0 picked at (-33.9376, 4.4367)
ref_plane "PlanoDeObra2" through (-5, 0, 0) normal (1, 0, 0) x (0, 1, 0)
sketch "Boceto9" plane through (0, 0, 0) normal (0, -1, 0) x (1, 0, 0)
sketch "Boceto10" plane through (-5, 0, 0) normal (1, 0, 0) x (0, 1, 0)
  circle A0 centre (-19, 0) radius 4
  line L0 (-20, -23.6837) -> (-20, 21.762)
  dimension "d31" = 8
  dimension "d32" = 1
extrude "Extruir5" cut sketch "Boceto10" against normal blind 48
sketch "Boceto11" plane through (0, 4, 0) normal (0, 1, 0) x (-1, 0, 0)
  circle A0 centre (0, 0) radius 20
  circle A1 centre (0, 0) radius 27
